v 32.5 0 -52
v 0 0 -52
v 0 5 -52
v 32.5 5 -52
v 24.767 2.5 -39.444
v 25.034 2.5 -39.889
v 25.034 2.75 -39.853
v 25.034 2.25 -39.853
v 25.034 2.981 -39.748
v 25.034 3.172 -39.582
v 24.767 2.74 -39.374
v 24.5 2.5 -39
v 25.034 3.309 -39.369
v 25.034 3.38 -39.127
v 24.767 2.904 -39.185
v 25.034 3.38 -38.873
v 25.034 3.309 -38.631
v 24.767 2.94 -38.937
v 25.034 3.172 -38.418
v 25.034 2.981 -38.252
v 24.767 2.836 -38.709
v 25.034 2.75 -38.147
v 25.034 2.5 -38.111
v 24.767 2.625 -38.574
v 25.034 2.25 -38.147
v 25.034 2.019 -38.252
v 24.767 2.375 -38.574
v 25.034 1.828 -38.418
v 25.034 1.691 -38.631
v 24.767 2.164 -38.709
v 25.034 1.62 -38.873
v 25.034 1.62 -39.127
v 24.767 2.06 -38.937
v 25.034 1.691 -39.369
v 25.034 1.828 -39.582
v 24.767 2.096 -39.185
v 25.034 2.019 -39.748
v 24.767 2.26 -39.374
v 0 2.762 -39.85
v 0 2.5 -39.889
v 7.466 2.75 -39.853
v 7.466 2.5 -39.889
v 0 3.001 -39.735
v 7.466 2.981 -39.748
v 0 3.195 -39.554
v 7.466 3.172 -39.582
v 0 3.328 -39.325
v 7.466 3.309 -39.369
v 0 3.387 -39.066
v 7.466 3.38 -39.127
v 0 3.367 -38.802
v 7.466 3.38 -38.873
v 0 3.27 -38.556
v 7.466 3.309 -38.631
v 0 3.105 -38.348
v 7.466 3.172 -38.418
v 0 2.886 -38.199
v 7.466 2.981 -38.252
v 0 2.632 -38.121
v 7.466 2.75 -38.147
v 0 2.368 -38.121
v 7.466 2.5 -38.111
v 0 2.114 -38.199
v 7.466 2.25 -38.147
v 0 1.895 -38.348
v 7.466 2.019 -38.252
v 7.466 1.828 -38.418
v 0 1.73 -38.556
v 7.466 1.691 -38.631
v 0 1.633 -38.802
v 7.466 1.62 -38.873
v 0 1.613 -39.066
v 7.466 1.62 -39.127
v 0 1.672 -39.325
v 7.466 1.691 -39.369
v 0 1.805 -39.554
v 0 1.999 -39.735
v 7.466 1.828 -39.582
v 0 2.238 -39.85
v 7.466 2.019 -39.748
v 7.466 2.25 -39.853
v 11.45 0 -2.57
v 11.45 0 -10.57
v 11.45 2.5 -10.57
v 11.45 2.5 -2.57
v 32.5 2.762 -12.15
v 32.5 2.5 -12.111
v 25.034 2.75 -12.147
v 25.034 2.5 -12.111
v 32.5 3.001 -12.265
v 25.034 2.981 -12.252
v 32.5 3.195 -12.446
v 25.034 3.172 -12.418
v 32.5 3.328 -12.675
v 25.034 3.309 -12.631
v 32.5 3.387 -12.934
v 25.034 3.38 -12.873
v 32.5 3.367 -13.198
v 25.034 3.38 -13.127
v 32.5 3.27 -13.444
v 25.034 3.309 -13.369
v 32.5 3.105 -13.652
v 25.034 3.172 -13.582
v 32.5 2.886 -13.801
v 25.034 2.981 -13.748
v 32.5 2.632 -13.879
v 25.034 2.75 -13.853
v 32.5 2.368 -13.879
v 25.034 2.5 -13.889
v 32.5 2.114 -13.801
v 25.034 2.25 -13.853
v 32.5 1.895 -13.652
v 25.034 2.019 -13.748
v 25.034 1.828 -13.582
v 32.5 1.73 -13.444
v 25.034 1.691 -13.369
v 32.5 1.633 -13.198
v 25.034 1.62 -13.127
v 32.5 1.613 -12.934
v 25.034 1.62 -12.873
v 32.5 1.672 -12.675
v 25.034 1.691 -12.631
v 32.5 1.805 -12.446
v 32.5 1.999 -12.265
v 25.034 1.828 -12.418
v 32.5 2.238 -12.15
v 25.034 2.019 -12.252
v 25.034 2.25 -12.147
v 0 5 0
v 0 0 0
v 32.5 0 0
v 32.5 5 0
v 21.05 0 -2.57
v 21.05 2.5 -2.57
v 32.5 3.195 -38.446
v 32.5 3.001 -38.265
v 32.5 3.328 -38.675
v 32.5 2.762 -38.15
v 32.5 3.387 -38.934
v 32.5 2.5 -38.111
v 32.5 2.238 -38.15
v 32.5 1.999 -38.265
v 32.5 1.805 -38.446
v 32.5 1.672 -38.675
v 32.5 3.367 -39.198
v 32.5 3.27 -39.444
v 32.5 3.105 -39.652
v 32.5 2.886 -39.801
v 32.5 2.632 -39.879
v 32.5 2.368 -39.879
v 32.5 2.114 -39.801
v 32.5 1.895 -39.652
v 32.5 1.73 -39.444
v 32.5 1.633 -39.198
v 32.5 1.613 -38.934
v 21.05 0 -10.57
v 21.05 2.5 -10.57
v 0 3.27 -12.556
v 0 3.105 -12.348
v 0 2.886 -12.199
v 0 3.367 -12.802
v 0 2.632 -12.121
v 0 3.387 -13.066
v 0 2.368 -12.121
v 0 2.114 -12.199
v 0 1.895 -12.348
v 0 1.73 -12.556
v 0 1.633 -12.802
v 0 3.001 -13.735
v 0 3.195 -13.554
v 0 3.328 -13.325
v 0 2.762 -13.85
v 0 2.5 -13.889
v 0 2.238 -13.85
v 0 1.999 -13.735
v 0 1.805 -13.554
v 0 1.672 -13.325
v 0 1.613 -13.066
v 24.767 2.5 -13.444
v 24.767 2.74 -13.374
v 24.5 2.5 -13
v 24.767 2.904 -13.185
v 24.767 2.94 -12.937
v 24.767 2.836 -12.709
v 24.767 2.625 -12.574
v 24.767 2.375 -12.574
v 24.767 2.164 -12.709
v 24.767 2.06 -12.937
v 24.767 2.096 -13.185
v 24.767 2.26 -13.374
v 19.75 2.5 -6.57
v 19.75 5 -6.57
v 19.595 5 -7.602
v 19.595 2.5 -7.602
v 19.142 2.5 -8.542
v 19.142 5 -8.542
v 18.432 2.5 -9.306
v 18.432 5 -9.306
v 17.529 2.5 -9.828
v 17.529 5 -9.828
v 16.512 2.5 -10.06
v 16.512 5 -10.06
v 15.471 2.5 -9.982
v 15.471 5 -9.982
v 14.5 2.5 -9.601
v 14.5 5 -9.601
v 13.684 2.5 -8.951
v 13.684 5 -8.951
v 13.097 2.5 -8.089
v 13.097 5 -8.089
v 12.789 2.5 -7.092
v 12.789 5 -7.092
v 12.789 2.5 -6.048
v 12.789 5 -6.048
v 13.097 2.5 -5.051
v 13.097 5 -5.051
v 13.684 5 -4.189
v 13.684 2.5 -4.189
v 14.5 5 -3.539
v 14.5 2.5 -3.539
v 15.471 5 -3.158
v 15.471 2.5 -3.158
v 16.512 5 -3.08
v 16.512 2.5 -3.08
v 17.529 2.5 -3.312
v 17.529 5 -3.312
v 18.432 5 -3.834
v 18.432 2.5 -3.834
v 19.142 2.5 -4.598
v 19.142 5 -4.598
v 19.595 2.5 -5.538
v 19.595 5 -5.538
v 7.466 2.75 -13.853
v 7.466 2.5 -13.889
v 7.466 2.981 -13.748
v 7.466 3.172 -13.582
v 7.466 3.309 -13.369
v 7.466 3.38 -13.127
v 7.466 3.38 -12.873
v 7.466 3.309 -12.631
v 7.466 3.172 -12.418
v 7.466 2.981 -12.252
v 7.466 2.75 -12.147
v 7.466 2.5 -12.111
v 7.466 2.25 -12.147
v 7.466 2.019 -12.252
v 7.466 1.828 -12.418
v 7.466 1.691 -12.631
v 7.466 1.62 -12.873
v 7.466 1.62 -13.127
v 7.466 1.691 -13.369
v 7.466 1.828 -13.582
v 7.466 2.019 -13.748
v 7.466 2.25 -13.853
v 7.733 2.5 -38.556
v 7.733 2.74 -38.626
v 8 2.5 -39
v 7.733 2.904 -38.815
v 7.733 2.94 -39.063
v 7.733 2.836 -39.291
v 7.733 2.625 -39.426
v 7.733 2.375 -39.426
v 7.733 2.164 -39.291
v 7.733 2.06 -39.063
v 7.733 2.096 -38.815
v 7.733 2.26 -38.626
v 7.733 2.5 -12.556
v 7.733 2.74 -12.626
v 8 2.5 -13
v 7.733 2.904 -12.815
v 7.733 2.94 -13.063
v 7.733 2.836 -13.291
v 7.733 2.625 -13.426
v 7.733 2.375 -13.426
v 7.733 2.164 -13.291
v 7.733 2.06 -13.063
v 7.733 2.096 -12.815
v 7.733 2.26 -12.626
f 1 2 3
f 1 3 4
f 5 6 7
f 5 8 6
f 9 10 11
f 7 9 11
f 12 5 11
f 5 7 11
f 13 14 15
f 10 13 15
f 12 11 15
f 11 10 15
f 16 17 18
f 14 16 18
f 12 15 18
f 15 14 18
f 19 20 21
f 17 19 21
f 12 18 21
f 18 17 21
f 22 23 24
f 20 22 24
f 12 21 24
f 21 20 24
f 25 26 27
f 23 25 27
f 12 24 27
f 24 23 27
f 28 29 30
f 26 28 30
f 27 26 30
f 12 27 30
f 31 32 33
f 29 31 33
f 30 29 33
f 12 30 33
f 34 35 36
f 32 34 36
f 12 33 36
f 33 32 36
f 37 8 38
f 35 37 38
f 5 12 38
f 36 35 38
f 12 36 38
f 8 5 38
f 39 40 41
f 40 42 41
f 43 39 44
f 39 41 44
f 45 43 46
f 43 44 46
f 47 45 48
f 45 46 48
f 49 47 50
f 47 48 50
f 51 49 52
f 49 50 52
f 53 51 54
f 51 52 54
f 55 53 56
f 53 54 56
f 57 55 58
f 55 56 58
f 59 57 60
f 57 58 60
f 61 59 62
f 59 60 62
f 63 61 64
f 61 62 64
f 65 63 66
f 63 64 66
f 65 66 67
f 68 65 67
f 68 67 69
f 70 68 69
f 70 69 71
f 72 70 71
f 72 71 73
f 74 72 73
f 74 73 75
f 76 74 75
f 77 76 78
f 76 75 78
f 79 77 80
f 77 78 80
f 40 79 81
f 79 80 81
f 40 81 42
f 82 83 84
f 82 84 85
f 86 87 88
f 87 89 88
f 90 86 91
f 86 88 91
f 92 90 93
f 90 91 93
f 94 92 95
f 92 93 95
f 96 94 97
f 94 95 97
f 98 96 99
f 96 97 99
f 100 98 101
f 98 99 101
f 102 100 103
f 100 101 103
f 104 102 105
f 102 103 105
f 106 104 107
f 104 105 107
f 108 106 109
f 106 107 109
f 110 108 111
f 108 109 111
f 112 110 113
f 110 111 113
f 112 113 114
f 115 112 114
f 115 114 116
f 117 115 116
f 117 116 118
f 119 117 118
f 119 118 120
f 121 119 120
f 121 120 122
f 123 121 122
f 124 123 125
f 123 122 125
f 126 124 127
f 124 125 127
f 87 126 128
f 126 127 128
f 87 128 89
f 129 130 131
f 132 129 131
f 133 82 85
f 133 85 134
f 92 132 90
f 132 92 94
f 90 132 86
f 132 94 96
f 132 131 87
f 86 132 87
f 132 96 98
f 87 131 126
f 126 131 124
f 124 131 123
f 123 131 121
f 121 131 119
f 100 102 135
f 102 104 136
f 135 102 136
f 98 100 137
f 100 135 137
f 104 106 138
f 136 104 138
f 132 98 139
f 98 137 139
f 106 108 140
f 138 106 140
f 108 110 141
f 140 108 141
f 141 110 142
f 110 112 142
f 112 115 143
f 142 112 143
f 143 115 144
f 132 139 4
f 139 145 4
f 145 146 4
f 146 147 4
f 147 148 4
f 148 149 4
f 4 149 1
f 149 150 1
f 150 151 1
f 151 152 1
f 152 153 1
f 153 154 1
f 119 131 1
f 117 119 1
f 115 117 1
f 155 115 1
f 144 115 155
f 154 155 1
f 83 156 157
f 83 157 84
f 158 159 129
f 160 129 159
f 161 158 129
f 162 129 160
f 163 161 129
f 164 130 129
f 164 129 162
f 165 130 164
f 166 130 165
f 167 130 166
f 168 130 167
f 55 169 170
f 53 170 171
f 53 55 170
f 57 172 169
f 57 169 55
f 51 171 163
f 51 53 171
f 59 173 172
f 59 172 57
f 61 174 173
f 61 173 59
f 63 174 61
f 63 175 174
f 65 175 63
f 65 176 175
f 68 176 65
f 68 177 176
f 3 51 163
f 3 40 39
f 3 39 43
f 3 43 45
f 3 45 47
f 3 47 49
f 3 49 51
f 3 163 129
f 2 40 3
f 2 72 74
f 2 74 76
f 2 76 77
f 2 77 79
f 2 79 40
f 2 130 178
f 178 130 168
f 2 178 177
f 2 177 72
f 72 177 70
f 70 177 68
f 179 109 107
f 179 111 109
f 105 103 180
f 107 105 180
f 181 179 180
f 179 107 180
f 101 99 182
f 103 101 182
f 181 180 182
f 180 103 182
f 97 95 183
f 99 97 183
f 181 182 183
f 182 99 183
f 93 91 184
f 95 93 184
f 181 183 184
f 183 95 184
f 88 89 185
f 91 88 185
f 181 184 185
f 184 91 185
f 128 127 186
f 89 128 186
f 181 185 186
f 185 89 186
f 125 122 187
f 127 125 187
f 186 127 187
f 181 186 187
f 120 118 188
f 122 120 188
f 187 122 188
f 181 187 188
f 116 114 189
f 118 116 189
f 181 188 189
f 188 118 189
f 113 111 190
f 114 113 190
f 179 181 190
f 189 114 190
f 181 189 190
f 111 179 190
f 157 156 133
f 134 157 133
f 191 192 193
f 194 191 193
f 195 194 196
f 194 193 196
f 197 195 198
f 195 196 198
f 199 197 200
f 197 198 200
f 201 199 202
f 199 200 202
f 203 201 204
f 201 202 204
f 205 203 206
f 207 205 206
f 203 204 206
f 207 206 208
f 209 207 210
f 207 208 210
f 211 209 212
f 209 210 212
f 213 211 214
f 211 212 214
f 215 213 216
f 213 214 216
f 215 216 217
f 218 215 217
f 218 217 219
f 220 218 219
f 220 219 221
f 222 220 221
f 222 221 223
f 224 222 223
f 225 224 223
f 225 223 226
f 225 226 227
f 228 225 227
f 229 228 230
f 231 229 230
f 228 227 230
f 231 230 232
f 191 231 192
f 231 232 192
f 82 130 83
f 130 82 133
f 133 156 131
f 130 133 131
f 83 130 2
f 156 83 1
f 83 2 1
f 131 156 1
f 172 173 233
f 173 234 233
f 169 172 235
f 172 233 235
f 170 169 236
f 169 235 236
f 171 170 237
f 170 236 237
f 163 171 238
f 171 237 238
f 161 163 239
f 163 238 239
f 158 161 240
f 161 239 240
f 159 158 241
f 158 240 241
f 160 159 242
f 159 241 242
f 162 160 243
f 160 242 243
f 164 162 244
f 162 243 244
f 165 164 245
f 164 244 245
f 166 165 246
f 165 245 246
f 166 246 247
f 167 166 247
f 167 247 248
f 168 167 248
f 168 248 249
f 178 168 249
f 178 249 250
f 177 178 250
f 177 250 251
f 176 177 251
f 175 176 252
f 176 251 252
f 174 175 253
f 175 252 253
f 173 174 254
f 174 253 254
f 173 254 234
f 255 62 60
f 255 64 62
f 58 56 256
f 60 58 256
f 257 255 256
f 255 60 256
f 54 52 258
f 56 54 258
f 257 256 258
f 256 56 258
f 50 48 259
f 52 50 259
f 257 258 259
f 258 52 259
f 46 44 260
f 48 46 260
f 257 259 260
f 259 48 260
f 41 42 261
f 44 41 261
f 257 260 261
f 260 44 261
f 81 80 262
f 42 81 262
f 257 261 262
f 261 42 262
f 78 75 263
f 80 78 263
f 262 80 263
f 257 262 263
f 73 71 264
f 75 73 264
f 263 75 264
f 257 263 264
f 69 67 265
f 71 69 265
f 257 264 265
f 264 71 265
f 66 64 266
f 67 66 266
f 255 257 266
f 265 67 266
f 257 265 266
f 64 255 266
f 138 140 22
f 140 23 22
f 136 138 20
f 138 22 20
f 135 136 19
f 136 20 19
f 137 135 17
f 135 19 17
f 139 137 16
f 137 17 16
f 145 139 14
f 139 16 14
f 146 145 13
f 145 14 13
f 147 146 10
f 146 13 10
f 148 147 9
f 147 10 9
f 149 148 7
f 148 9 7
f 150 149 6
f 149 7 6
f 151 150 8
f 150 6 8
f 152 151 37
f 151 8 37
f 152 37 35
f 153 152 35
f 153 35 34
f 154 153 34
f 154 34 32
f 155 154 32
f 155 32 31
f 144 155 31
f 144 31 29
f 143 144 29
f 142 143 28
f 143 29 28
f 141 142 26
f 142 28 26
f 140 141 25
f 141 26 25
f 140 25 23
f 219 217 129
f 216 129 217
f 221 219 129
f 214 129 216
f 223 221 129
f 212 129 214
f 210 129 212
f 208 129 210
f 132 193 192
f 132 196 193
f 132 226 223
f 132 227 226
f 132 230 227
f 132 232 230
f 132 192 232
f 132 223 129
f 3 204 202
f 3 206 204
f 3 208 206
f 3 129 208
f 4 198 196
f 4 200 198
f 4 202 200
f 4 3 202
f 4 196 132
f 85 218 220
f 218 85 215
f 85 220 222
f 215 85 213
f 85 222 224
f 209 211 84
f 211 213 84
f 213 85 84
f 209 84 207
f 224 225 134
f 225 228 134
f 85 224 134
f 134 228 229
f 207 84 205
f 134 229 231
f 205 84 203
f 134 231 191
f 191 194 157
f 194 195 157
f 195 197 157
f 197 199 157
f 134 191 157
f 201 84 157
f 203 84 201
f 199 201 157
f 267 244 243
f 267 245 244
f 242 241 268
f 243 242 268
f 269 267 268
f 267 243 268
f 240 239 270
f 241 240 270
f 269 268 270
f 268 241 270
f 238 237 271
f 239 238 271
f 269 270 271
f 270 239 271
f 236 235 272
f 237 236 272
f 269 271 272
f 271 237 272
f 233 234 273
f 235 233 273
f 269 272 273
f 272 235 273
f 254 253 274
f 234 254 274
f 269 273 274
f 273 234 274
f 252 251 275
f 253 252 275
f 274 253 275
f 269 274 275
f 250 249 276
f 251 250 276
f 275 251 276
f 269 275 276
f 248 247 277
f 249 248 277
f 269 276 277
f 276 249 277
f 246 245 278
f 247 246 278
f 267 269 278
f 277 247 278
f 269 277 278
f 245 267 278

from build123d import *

# Parameters (mm, degrees)
SKETCH1_W                 = 32.5
SKETCH1_H                 = 52
BOSS_EXTRUDE1_DEPTH       = 5
F_2_56_TAPPED_HOLE1_D     = 1.778
F_2_56_TAPPED_HOLE1_DEPTH = 7.46583491
F_2_56_TAPPED_HOLE1_TIP   = 0.53416509
F_2_56_TAPPED_HOLE2_D     = 1.778
F_2_56_TAPPED_HOLE2_DEPTH = 7.46583491
F_2_56_TAPPED_HOLE2_TIP   = 0.53416509
CUT_EXTRUDE2_DEPTH        = 2.5
SKETCH10_R                = 3.5
CUT_EXTRUDE3_DEPTH        = 2.5


with BuildPart() as part:
    # Sketch1 → Boss-Extrude1 (new body)
    with BuildSketch(Plane(origin=(0, 0, 0), x_dir=(1, 0, 0), z_dir=(0, 1, 0))):
        with Locations((16.25, 26)):
            Rectangle(SKETCH1_W, SKETCH1_H)
    extrude(amount=BOSS_EXTRUDE1_DEPTH)

    # #2-56 Tapped Hole1
    with Locations(Plane.ZY):
        with Locations((-39, 2.5), (-13, 2.5)):
            Hole(F_2_56_TAPPED_HOLE1_D / 2, depth=F_2_56_TAPPED_HOLE1_DEPTH)
            with Locations((0, 0, -(F_2_56_TAPPED_HOLE1_DEPTH + F_2_56_TAPPED_HOLE1_TIP / 2))):  # 118° drill point
                Cone(0, F_2_56_TAPPED_HOLE1_D / 2, F_2_56_TAPPED_HOLE1_TIP, mode=Mode.SUBTRACT)

    # #2-56 Tapped Hole2
    with Locations(Plane(origin=(32.5, 0, 0), x_dir=(0, 0, -1), z_dir=(1, 0, 0))):
        with Locations((13, 2.5), (39, 2.5)):
            Hole(F_2_56_TAPPED_HOLE2_D / 2, depth=F_2_56_TAPPED_HOLE2_DEPTH)
            with Locations((0, 0, -(F_2_56_TAPPED_HOLE2_DEPTH + F_2_56_TAPPED_HOLE2_TIP / 2))):  # 118° drill point
                Cone(0, F_2_56_TAPPED_HOLE2_D / 2, F_2_56_TAPPED_HOLE2_TIP, mode=Mode.SUBTRACT)

    # Sketch11 → Cut-Extrude2 (cut)
    with BuildSketch(Plane(origin=(0, 0, 0), x_dir=(-1, 0, 0), z_dir=(0, -1, 0))):
        Polygon((-21.05, 6.57), (-21.05, 10.57), (-11.45, 10.57), (-11.45, 2.57), (-21.05, 2.57), align=None)
    extrude(amount=-CUT_EXTRUDE2_DEPTH, mode=Mode.SUBTRACT)

    # Sketch10 → Cut-Extrude3 (cut)
    with BuildSketch(Plane(origin=(0, 5, 0), x_dir=(1, 0, 0), z_dir=(0, 1, 0))):
        with Locations((16.25, 6.57)):
            Circle(SKETCH10_R)
    extrude(amount=-CUT_EXTRUDE3_DEPTH, mode=Mode.SUBTRACT)


solid = part.part
